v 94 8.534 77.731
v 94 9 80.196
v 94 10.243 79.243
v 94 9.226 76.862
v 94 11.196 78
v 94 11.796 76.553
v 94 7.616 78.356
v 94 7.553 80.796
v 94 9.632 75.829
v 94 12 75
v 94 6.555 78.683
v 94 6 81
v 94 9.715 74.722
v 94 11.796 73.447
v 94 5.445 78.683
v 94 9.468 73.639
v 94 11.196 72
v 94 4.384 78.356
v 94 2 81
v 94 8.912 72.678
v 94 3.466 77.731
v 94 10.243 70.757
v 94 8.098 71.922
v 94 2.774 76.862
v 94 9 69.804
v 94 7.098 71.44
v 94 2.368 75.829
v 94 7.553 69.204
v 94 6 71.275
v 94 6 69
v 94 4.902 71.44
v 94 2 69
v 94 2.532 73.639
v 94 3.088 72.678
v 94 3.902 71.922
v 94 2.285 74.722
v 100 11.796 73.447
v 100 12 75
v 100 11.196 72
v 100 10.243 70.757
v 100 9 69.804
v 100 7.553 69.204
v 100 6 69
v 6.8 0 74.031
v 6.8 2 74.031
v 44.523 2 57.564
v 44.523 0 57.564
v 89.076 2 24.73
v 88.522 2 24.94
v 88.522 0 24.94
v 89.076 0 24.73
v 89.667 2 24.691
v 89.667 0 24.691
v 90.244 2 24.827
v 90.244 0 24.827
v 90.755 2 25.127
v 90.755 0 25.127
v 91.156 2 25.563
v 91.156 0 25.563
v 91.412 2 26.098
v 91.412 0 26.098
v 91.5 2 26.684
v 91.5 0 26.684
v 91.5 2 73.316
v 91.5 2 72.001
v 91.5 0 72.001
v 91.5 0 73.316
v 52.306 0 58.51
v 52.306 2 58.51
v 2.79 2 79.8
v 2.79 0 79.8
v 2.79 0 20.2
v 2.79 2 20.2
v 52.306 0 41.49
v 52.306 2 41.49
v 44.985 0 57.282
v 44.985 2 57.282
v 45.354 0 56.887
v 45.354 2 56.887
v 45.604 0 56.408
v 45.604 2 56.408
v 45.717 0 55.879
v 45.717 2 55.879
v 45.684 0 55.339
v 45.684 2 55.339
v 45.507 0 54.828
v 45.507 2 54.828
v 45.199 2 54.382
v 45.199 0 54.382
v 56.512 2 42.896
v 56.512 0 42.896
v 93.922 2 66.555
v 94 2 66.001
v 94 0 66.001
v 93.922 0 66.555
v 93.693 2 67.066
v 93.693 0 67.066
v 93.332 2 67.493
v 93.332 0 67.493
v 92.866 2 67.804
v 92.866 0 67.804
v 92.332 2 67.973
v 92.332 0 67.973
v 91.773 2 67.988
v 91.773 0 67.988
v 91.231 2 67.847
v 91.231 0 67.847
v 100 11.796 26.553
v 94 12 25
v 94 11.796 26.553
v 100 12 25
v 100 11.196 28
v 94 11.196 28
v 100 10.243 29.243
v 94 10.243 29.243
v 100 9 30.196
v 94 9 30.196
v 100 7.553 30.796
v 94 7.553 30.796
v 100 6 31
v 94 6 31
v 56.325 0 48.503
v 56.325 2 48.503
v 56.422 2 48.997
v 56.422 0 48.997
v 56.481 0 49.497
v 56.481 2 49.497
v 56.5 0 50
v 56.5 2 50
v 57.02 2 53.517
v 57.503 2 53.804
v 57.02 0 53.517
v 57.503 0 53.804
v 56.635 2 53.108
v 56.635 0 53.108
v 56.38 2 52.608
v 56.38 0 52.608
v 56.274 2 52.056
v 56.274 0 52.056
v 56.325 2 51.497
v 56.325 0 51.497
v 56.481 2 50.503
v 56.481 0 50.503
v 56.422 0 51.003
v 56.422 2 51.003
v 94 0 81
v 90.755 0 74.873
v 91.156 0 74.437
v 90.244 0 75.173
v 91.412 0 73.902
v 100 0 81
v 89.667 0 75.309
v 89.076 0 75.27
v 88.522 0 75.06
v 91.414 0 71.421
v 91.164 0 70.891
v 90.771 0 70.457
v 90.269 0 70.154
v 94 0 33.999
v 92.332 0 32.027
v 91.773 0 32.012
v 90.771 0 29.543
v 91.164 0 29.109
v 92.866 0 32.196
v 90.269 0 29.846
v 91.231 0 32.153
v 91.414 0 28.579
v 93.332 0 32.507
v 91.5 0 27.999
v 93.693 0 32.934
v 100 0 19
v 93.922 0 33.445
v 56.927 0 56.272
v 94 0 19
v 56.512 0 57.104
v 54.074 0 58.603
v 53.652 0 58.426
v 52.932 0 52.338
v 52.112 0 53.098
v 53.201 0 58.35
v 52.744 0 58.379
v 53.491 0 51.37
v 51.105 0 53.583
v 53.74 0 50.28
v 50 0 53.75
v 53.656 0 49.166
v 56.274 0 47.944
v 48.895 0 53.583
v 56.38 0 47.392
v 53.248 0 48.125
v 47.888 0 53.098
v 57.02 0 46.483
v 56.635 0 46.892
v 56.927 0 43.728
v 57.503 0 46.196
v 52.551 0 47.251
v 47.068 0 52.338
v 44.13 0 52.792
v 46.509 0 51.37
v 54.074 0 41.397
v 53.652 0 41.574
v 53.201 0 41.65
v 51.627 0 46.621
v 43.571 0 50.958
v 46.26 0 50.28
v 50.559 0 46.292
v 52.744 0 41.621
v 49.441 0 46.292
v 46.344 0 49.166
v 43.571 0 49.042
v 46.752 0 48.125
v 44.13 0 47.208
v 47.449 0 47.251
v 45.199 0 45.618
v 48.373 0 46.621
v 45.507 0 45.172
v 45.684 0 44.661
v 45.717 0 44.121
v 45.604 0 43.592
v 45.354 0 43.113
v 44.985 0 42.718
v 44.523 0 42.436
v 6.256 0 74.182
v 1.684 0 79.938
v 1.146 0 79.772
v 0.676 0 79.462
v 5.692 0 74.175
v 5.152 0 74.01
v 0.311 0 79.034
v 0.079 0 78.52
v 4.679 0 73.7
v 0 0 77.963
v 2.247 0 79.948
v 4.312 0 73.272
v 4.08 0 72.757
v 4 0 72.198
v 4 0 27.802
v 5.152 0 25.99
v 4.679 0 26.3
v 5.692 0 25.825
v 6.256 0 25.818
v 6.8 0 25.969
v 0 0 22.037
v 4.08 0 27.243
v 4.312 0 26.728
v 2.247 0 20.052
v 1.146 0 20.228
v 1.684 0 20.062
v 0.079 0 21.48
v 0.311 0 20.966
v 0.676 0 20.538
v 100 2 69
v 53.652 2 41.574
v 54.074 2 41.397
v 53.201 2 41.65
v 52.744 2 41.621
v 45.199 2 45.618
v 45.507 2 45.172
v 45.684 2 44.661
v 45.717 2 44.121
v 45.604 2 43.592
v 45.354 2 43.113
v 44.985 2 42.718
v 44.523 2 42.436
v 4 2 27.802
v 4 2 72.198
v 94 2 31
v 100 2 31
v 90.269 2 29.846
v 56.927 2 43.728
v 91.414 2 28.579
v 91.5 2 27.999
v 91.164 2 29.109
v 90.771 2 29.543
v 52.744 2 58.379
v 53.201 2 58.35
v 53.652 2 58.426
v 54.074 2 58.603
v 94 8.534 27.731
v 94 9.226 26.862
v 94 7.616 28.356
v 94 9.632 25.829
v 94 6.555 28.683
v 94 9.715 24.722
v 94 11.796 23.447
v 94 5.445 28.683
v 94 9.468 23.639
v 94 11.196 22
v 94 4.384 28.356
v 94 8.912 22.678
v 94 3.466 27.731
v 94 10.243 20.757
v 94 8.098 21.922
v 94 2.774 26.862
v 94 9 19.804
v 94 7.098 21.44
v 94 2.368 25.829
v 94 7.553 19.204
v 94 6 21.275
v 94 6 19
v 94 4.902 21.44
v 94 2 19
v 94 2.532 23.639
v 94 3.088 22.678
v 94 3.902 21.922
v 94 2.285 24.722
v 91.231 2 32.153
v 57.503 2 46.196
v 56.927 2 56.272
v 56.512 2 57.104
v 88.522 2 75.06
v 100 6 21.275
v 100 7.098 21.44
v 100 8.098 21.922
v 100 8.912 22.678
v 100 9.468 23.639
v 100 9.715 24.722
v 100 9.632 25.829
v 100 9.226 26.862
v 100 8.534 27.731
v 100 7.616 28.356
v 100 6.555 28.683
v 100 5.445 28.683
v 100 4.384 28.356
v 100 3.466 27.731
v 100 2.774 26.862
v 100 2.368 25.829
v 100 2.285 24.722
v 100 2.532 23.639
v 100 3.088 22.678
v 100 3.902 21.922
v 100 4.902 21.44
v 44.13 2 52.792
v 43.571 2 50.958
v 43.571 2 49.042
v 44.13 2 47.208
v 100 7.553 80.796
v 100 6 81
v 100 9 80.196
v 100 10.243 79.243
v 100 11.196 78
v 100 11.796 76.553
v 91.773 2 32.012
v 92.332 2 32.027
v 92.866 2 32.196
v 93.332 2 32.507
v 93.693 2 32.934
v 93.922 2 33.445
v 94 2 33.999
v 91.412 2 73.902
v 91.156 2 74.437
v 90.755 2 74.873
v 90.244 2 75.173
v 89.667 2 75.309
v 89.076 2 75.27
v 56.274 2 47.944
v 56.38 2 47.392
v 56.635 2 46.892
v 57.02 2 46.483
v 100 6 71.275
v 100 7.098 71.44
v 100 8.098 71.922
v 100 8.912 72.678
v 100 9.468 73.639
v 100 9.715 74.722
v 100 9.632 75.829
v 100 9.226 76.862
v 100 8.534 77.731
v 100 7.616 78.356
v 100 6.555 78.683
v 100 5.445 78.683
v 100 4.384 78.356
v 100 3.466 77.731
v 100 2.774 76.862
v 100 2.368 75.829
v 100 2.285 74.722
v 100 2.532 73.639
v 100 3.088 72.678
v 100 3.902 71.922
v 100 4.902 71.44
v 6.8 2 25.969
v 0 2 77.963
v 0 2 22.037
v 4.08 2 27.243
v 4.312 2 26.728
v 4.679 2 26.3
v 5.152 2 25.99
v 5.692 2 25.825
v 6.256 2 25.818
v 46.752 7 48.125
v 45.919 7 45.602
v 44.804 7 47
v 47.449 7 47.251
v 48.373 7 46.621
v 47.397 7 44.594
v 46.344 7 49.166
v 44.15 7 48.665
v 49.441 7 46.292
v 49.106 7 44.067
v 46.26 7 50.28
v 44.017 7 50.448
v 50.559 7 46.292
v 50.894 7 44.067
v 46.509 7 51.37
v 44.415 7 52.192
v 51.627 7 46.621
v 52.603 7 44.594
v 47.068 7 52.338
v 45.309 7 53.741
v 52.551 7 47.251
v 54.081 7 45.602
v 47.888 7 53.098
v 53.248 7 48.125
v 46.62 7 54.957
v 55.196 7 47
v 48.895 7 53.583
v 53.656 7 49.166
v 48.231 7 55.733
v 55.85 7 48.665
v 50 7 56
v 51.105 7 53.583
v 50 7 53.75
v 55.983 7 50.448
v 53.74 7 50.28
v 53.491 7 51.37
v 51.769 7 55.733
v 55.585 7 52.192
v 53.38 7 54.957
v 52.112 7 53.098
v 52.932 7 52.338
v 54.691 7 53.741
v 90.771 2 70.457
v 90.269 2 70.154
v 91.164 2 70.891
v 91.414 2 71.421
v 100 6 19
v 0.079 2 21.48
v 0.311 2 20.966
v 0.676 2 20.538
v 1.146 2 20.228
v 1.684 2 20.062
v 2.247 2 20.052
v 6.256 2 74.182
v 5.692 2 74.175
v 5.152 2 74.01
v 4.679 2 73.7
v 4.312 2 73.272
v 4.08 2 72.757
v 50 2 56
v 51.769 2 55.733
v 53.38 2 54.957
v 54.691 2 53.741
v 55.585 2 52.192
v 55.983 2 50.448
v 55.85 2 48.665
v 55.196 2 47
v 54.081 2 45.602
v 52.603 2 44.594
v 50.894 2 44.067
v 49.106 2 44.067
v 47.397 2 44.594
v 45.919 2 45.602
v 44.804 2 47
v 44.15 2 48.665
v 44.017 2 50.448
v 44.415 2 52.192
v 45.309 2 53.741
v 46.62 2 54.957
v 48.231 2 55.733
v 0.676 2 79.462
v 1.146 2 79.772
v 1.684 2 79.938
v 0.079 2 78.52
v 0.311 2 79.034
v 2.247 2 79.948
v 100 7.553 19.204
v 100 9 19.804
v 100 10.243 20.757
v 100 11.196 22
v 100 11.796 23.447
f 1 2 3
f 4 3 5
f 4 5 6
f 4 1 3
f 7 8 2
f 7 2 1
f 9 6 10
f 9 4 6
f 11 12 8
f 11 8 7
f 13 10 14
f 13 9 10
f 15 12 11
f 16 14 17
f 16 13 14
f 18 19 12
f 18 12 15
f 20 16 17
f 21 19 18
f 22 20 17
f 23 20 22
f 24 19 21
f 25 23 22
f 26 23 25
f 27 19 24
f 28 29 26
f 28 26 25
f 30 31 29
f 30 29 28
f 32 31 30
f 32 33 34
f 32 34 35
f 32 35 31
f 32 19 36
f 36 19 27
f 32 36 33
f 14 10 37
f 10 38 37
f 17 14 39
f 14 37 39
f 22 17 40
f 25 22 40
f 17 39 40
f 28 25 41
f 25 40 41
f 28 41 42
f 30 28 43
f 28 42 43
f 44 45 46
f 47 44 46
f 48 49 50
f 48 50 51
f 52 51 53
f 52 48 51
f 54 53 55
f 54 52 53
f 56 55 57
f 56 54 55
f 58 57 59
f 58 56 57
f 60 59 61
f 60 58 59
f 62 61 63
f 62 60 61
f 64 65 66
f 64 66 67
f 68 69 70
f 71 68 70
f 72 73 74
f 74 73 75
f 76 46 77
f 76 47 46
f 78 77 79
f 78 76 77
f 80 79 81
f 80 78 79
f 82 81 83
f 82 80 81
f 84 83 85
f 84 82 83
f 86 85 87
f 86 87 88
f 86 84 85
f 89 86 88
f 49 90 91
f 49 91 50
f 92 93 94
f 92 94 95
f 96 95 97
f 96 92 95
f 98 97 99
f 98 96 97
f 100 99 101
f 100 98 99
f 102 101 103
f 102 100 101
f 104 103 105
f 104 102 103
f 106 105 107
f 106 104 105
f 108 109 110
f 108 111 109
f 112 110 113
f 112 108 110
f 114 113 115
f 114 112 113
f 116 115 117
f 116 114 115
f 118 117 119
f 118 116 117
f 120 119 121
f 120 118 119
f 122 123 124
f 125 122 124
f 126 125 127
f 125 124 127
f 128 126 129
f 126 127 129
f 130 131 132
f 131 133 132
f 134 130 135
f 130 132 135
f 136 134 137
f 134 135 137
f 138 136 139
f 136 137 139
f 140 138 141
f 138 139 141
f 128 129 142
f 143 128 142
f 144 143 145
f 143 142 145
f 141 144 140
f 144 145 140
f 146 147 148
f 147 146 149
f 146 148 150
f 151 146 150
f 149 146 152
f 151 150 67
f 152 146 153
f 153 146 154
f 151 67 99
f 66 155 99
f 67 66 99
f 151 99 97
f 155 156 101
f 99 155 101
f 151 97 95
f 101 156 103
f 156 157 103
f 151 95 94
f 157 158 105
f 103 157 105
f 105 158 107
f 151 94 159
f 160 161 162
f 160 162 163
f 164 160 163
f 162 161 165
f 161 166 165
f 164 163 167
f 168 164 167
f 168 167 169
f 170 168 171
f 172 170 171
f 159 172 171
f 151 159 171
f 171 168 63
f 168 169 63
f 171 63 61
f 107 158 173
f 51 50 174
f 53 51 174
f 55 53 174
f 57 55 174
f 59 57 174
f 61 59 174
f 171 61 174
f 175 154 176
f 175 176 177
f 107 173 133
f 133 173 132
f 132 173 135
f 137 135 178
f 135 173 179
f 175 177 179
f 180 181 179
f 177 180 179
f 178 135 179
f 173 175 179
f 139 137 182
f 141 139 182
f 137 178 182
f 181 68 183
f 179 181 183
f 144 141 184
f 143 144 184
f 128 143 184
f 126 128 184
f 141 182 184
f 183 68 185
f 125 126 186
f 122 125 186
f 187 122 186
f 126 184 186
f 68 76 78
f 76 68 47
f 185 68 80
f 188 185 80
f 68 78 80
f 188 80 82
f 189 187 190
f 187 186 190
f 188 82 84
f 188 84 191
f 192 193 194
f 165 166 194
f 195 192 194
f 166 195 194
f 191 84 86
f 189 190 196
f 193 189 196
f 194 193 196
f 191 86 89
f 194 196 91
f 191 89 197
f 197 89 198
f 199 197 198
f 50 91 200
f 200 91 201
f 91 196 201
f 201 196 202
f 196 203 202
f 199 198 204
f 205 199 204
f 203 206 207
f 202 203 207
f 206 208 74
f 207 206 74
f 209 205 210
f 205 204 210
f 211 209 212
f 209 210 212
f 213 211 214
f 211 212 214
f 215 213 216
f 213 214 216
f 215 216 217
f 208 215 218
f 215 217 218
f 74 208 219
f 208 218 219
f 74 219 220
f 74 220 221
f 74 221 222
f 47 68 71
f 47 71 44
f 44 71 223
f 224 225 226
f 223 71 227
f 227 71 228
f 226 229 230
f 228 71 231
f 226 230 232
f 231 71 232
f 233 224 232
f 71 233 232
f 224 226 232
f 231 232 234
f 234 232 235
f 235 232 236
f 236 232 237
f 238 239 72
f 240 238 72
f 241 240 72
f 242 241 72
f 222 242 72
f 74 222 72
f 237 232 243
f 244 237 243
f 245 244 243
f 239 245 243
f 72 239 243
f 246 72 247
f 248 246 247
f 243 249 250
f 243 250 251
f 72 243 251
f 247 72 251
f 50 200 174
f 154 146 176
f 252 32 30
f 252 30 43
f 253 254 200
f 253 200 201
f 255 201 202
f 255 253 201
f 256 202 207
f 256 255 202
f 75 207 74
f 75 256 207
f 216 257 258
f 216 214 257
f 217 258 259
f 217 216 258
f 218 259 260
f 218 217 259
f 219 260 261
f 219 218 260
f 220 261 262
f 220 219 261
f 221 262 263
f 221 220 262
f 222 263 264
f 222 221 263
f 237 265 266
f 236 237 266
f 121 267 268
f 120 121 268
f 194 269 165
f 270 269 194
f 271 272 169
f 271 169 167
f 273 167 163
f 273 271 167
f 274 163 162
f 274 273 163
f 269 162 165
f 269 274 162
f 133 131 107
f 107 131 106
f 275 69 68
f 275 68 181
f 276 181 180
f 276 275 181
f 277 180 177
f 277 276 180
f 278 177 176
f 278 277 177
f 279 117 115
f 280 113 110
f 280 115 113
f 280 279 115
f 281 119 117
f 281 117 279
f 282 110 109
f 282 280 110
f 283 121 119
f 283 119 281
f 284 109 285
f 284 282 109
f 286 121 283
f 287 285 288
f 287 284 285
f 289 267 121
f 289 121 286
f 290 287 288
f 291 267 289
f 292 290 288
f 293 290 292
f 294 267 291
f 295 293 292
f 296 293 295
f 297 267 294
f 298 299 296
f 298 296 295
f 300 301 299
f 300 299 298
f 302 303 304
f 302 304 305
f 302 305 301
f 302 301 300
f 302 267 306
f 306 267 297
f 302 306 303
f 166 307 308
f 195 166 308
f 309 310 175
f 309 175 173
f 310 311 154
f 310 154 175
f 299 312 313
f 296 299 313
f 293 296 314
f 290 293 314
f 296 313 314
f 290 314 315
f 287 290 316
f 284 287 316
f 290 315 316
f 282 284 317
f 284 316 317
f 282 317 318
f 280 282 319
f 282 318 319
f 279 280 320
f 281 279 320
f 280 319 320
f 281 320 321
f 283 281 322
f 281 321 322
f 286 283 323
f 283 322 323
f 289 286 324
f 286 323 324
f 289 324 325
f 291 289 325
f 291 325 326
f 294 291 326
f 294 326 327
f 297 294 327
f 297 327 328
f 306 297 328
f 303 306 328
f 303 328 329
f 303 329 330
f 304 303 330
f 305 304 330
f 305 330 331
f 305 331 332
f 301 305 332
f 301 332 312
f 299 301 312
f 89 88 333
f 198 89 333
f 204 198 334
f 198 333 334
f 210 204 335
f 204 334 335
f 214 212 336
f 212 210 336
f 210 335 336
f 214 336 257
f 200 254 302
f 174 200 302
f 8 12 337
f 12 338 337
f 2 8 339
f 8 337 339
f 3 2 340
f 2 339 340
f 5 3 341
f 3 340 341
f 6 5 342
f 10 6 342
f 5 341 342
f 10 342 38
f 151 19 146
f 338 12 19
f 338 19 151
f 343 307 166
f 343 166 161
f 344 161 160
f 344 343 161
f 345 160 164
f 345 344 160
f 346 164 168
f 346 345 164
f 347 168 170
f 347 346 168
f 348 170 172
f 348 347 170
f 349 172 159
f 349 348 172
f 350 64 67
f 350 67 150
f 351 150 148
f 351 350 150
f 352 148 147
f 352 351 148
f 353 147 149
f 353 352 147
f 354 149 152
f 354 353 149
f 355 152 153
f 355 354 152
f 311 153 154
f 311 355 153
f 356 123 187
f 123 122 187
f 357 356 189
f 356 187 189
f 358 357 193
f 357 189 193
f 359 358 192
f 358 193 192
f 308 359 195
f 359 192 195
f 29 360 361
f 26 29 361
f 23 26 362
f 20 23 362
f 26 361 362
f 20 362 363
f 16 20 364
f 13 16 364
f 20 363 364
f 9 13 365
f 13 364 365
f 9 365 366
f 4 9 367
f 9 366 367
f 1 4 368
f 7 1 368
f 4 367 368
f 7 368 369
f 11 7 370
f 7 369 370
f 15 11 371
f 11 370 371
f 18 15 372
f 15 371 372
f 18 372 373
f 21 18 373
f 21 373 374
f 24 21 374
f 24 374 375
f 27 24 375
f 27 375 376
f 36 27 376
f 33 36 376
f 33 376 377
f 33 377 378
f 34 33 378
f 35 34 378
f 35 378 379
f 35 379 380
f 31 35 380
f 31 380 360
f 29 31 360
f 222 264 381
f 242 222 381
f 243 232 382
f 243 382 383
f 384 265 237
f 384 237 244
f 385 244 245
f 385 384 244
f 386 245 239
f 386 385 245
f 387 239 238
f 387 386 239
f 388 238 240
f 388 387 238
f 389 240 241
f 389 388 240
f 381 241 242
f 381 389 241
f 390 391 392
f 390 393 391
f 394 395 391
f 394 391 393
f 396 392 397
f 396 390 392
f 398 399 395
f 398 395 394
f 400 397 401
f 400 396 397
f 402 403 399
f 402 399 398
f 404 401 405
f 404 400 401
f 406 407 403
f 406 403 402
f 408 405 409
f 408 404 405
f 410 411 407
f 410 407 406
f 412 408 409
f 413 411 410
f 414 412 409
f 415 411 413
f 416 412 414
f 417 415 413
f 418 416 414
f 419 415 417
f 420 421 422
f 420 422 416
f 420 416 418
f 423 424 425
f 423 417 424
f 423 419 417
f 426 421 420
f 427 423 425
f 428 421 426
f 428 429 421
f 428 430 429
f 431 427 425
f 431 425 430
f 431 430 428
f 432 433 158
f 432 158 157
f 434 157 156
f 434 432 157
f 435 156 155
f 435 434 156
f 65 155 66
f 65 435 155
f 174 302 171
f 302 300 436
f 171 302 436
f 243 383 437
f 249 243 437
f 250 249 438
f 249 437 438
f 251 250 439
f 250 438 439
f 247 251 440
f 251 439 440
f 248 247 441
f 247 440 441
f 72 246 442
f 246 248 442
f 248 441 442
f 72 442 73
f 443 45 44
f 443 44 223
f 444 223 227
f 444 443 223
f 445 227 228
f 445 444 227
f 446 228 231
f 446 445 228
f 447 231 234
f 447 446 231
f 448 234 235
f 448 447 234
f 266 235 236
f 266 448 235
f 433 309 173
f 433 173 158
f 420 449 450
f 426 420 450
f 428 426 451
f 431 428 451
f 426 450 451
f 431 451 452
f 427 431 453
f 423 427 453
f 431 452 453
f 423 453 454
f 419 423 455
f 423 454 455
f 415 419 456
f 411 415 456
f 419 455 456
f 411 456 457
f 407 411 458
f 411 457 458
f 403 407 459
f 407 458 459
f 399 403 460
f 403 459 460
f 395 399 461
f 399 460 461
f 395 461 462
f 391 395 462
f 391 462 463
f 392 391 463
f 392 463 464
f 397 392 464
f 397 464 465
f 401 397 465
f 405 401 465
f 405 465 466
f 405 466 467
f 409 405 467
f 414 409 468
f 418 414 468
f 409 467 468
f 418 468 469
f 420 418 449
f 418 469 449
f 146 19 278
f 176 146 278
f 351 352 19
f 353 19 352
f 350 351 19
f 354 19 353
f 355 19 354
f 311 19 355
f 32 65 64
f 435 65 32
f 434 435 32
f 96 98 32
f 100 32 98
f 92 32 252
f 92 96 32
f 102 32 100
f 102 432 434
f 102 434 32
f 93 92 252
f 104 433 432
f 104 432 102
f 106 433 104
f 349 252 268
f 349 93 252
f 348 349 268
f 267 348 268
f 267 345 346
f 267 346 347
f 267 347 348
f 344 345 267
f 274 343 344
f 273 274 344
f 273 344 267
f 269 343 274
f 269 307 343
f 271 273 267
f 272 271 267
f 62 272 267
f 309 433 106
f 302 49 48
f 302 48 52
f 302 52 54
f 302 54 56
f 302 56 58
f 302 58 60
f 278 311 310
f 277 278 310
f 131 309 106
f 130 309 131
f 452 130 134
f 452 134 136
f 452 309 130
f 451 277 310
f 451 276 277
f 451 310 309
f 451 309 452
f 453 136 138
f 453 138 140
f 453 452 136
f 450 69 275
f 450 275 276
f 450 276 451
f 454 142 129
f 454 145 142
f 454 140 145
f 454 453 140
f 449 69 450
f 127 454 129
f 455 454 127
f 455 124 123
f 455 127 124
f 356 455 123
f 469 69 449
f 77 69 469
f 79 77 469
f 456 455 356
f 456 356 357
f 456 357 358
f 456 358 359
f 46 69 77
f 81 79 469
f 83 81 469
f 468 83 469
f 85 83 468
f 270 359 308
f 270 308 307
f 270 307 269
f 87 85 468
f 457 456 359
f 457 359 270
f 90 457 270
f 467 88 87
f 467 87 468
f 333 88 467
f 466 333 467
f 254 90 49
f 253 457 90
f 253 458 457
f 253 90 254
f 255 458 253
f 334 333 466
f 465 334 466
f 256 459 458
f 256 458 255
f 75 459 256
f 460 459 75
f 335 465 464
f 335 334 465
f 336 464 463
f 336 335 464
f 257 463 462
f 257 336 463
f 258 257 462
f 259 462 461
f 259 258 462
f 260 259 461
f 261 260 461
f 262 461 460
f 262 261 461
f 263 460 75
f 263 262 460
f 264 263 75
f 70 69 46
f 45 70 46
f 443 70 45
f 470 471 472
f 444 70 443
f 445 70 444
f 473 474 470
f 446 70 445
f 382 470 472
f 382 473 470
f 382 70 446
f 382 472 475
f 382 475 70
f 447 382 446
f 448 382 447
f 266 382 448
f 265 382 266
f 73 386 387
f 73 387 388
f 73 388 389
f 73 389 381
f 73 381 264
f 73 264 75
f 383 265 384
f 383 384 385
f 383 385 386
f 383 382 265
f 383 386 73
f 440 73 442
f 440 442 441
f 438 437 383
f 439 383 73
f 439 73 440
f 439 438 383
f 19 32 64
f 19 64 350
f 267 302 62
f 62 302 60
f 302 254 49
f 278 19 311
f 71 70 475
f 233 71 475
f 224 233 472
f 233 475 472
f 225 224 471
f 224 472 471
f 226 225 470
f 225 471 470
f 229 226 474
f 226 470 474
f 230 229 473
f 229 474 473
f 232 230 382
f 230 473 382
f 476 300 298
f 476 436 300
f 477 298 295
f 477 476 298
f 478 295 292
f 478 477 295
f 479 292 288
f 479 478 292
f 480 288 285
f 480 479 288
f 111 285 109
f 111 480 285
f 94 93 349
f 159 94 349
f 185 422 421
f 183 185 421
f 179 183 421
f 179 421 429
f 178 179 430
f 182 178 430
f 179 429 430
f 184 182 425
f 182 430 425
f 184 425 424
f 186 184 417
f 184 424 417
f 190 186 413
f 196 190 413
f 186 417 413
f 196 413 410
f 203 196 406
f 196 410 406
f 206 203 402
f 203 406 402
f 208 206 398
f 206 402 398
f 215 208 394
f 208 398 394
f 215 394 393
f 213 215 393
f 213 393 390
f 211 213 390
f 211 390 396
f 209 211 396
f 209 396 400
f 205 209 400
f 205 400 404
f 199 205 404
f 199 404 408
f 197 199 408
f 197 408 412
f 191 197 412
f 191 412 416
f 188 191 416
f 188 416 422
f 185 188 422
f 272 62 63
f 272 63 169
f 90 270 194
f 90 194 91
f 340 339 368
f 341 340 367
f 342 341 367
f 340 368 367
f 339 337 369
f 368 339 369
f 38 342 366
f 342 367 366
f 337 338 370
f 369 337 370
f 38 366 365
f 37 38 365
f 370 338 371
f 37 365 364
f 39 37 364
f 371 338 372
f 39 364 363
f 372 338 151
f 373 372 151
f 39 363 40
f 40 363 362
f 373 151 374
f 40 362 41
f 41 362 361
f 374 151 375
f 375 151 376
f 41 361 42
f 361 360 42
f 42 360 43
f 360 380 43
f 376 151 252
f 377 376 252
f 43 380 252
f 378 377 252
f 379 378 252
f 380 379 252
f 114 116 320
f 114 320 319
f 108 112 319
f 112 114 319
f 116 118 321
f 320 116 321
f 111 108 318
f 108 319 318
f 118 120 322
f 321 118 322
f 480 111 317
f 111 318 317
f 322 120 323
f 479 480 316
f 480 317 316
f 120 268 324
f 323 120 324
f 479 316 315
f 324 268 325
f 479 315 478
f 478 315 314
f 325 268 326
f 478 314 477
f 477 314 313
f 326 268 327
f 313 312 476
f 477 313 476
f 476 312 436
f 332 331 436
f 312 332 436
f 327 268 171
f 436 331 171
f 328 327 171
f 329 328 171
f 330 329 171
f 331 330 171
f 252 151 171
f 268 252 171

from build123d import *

# Parameters (mm, degrees)
SKETCH_1_W          = 100
SKETCH_1_H          = 100
EXTRUDE_1_DEPTH     = 2
SKETCH_2_W          = 6
SKETCH_2_H          = 12
EXTRUDE_2_DEPTH     = 10
SKETCH_3_R          = 3.725
CUT_EXTRUDE_1_DEPTH = 142.929559994
SKETCH_4_R          = 6
EXTRUDE_3_DEPTH     = 5
SKETCH_5_R          = 3.75
CUT_EXTRUDE_2_DEPTH = 142.594491418
SKETCH_6_W          = 100
SKETCH_6_H          = 19
CUT_EXTRUDE_3_DEPTH = 142.774468788
CUT_EXTRUDE_4_DEPTH = 130.077496102
FILLET_1_R          = 6
CUT_EXTRUDE_6_DEPTH = 130.077496102
FILLET_2_R          = 2
FILLET_3_R          = 2


# Some blends are built 0.0001 mm under size
with BuildPart() as part:
    # 草图1 → 凸台-拉伸1 (new body)
    with BuildSketch(Plane(origin=(0, 0, 0), x_dir=(1, 0, 0), z_dir=(0, 1, 0))):
        with Locations((50, -50)):
            Rectangle(SKETCH_1_W, SKETCH_1_H)
    extrude(amount=EXTRUDE_1_DEPTH)

    # 草图2 → 凸台-拉伸2 (add)
    with BuildSketch(Plane(origin=(0, 2, 0), x_dir=(1, 0, 0), z_dir=(0, 1, 0))):
        with Locations((97, -25)):
            Rectangle(SKETCH_2_W, SKETCH_2_H)
        with Locations((97, -75)):
            Rectangle(SKETCH_2_W, SKETCH_2_H)
    extrude(amount=EXTRUDE_2_DEPTH)

    # 草图3 → 切除-拉伸1 (cut, through all)
    with BuildSketch(Plane(origin=(100, 0, 0), x_dir=(0, 0, -1), z_dir=(1, 0, 0))):
        with Locations((-25, 6)):
            Circle(SKETCH_3_R)
        with Locations((-75, 6)):
            Circle(SKETCH_3_R)
    extrude(amount=-CUT_EXTRUDE_1_DEPTH, mode=Mode.SUBTRACT)

    # 草图4 → 凸台-拉伸3 (add)
    with BuildSketch(Plane(origin=(0, 2, 0), x_dir=(1, 0, 0), z_dir=(0, 1, 0))):
        with Locations(Location((50, -50, 0), (0, 0, 270))):
            Circle(SKETCH_4_R)
    extrude(amount=EXTRUDE_3_DEPTH)

    # 草图5 → 切除-拉伸2 (cut, through all)
    with BuildSketch(Plane(origin=(0, 7, 0), x_dir=(1, 0, 0), z_dir=(0, 1, 0))):
        with Locations(Location((50, -50, 0), (0, 0, 270))):
            Circle(SKETCH_5_R)
    extrude(amount=-CUT_EXTRUDE_2_DEPTH, mode=Mode.SUBTRACT)

    # 草图6 → 切除-拉伸3 (cut, through all)
    with BuildSketch(Plane(origin=(0, 2, 0), x_dir=(1, 0, 0), z_dir=(0, 1, 0))):
        with Locations((50, -90.5)):
            Rectangle(SKETCH_6_W, SKETCH_6_H)
        with Locations((50, -9.5)):
            Rectangle(SKETCH_6_W, SKETCH_6_H)
    extrude(amount=-CUT_EXTRUDE_3_DEPTH, mode=Mode.SUBTRACT)

    # 草图7 → 切除-拉伸4 (cut, through all)
    with BuildSketch(Plane(origin=(0, 2, 0), x_dir=(1, 0, 0), z_dir=(0, 1, 0))):
        with BuildLine():
            Line((55.73131114, -53.066279932), (94, -69))
            Line((94, -69), (94, -31))
            Line((94, -31), (55.73131114, -46.933720068))
            ThreePointArc((55.73131114, -46.933720068), (56.304899777, -48.41941821), (56.5, -50))
            ThreePointArc((56.5, -50), (56.304899777, -51.58058179), (55.73131114, -53.066279932))
        make_face()
        Polygon((0, -19), (53.212773637, -41.880071279), (94, -19), align=None)
        with BuildLine():
            Line((4, -75.253806127), (47.820913419, -56.123853499))
            ThreePointArc((47.820913419, -56.123853499), (43.5, -50), (47.820913419, -43.876146501))
            Line((47.820913419, -43.876146501), (4, -24.746193873))
            Line((4, -24.746193873), (4, -75.253806127))
        make_face()
        Polygon((94, -81), (53.212773637, -58.119928721), (0, -81), align=None)
    extrude(amount=-CUT_EXTRUDE_4_DEPTH, mode=Mode.SUBTRACT)

    # 圆角1
    fillet_1_edges = [part.edges().sort_by_distance(p)[0] for p in [
        (97, 12, 81),
        (97, 12, 69),
        (97, 12, 31),
        (97, 12, 19),
    ]]
    fillet(fillet_1_edges, radius=FILLET_1_R - 0.0001)  # a hair under: the kernel refuses the full size

    # 草图8 → 切除-拉伸6 (cut, through all)
    with BuildSketch(Plane(origin=(0, 2, 0), x_dir=(1, 0, 0), z_dir=(0, 1, 0))):
        Polygon((91.5, -23.268889447), (91.5, -29.332868234), (56.926900292, -43.727876504), (56.51218358, -42.895713945), align=None)
        Polygon((91.5, -70.667131766), (91.5, -76.731110553), (56.51218358, -57.104286055), (56.926900292, -56.272123496), align=None)
    extrude(amount=-CUT_EXTRUDE_6_DEPTH, mode=Mode.SUBTRACT)

    # 圆角2
    fillet_2_edges = [part.edges().sort_by_distance(p)[0] for p in [
        (47.820913419, 1, 43.876146501),
        (47.820913419, 1, 56.123853499),
        (55.73131114, 1, 53.066279932),
        (55.73131114, 1, 46.933720068),
    ]]
    fillet(fillet_2_edges, radius=FILLET_2_R)

    # 圆角3
    # the kernel refuses this fillet: 2 mm, written as the material it adds along each edge
    with BuildSketch(Plane(origin=(4, 2, 75.253806127), x_dir=(0, 0, -1), z_dir=(0, -1, 0)), Plane(origin=(4, 2, 24.746193873), x_dir=(0.9164772733710811, 0, 0.4000867498359684), z_dir=(0, -1, 0))) as fillet_3_piece_1:
        with BuildLine():
            CenterArc((FILLET_3_R * 1.52768299937, FILLET_3_R), FILLET_3_R, 156.416398259, 113.583601741)
            Line((FILLET_3_R * 0.611205725997, FILLET_3_R * 1.40008674984), (0, 0))
            Line((0, 0), (FILLET_3_R * 1.52768299937, 0))
        make_face()
    extrude(amount=2)
    with BuildSketch(Plane(origin=(53.212773637, 2, 58.119928721), x_dir=(-0.9186780925924477, 0, 0.39500704068497583), z_dir=(0, -1, 0))) as fillet_3_piece_2:
        with BuildLine():
            CenterArc((FILLET_3_R * 0.493765794488, -FILLET_3_R), FILLET_3_R, 90, 52.557168538)
            Line((-FILLET_3_R * 0.300194560291, -FILLET_3_R * 0.39203046537), (0, 0))
            Line((0, 0), (FILLET_3_R * 0.493765794488, 0))
        make_face()
    extrude(amount=2)
    with BuildSketch(Plane(origin=(53.212773637, 2, 41.880071279), x_dir=(-0.918678092592448, 0, -0.395007040684975), z_dir=(0, -1, 0))) as fillet_3_piece_3:
        with BuildLine():
            CenterArc((FILLET_3_R * 0.493765794488, FILLET_3_R), FILLET_3_R, 217.442831462, 52.557168538)
            Line((-FILLET_3_R * 0.300194560291, FILLET_3_R * 0.39203046537), (0, 0))
            Line((0, 0), (FILLET_3_R * 0.493765794488, 0))
        make_face()
    extrude(amount=2)
    with BuildSketch(Plane(origin=(91.5, 2, 23.268889447), x_dir=(-0.8721482225909527, 0, 0.48924173762204914), z_dir=(0, -1, 0))) as fillet_3_piece_4:
        with BuildLine():
            CenterArc((FILLET_3_R * 1.70755577899, -FILLET_3_R), FILLET_3_R, 90, 119.290755367)
            Line((FILLET_3_R * 0.8354075564, -FILLET_3_R * 1.48924173762), (0, 0))
            Line((0, 0), (FILLET_3_R * 1.70755577899, 0))
        make_face()
    extrude(amount=2)
    with BuildSketch(Plane(origin=(91.5, 2, 29.332868234), x_dir=(-0.9231759584436576, 0, 0.38437761348917576), z_dir=(0, -1, 0))) as fillet_3_piece_5:
        with BuildLine():
            CenterArc((FILLET_3_R * 0.666852706551, FILLET_3_R), FILLET_3_R, 202.605107184, 67.394892816)
            Line((-FILLET_3_R * 0.256323251893, FILLET_3_R * 0.615622386511), (0, 0))
            Line((0, 0), (FILLET_3_R * 0.666852706551, 0))
        make_face()
    extrude(amount=2)
    with BuildSketch(Plane(origin=(91.5, 2, 70.667131766), x_dir=(-0.923175958443657, 0, -0.38437761348917726), z_dir=(0, -1, 0))) as fillet_3_piece_6:
        with BuildLine():
            CenterArc((FILLET_3_R * 0.666852706551, -FILLET_3_R), FILLET_3_R, 90, 67.394892816)
            Line((-FILLET_3_R * 0.256323251893, -FILLET_3_R * 0.615622386511), (0, 0))
            Line((0, 0), (FILLET_3_R * 0.666852706551, 0))
        make_face()
    extrude(amount=2)
    with BuildSketch(Plane(origin=(91.5, 2, 76.731110553), x_dir=(-0.8721482225909533, 0, -0.4892417376220482), z_dir=(0, -1, 0))) as fillet_3_piece_7:
        with BuildLine():
            CenterArc((FILLET_3_R * 1.70755577899, FILLET_3_R), FILLET_3_R, 150.709244633, 119.290755367)
            Line((FILLET_3_R * 0.8354075564, FILLET_3_R * 1.48924173762), (0, 0))
            Line((0, 0), (FILLET_3_R * 1.70755577899, 0))
        make_face()
    extrude(amount=2)
    with BuildSketch(Plane(origin=(94, 2, 31), x_dir=(0, 0, 1), z_dir=(0, -1, 0)), Plane(origin=(94, 2, 69), x_dir=(-0.9231759584436573, 0, -0.3843776134891767), z_dir=(0, -1, 0))) as fillet_3_piece_8:
        with BuildLine():
            CenterArc((FILLET_3_R * 1.49958152704, FILLET_3_R), FILLET_3_R, 157.394892816, 112.605107184)
            Line((FILLET_3_R * 0.576405568596, FILLET_3_R * 1.38437761349), (0, 0))
            Line((0, 0), (FILLET_3_R * 1.49958152704, 0))
        make_face()
    extrude(amount=2)
    # the kernel refuses this fillet: 2 mm, written as the material it takes off along each edge
    with BuildSketch(Plane(origin=(0, 9.592469288, 81), x_dir=(0.9186780925924475, 0, -0.3950070406849762), z_dir=(0, -1, 0)), Plane(origin=(0, 9.592469288, 19), x_dir=(0, 0, 1), z_dir=(0, -1, 0))) as fillet_3_2_piece_1:
        with BuildLine():
            CenterArc((FILLET_3_R * 1.51849385757, -FILLET_3_R), FILLET_3_R, 90, 113.266413172)
            Line((FILLET_3_R * 0.599815764977, -FILLET_3_R * 1.39500704068), (0, 0))
            Line((0, 0), (FILLET_3_R * 1.51849385757, 0))
        make_face()
    extrude(amount=17.184938576, mode=Mode.SUBTRACT)


solid = part.part
